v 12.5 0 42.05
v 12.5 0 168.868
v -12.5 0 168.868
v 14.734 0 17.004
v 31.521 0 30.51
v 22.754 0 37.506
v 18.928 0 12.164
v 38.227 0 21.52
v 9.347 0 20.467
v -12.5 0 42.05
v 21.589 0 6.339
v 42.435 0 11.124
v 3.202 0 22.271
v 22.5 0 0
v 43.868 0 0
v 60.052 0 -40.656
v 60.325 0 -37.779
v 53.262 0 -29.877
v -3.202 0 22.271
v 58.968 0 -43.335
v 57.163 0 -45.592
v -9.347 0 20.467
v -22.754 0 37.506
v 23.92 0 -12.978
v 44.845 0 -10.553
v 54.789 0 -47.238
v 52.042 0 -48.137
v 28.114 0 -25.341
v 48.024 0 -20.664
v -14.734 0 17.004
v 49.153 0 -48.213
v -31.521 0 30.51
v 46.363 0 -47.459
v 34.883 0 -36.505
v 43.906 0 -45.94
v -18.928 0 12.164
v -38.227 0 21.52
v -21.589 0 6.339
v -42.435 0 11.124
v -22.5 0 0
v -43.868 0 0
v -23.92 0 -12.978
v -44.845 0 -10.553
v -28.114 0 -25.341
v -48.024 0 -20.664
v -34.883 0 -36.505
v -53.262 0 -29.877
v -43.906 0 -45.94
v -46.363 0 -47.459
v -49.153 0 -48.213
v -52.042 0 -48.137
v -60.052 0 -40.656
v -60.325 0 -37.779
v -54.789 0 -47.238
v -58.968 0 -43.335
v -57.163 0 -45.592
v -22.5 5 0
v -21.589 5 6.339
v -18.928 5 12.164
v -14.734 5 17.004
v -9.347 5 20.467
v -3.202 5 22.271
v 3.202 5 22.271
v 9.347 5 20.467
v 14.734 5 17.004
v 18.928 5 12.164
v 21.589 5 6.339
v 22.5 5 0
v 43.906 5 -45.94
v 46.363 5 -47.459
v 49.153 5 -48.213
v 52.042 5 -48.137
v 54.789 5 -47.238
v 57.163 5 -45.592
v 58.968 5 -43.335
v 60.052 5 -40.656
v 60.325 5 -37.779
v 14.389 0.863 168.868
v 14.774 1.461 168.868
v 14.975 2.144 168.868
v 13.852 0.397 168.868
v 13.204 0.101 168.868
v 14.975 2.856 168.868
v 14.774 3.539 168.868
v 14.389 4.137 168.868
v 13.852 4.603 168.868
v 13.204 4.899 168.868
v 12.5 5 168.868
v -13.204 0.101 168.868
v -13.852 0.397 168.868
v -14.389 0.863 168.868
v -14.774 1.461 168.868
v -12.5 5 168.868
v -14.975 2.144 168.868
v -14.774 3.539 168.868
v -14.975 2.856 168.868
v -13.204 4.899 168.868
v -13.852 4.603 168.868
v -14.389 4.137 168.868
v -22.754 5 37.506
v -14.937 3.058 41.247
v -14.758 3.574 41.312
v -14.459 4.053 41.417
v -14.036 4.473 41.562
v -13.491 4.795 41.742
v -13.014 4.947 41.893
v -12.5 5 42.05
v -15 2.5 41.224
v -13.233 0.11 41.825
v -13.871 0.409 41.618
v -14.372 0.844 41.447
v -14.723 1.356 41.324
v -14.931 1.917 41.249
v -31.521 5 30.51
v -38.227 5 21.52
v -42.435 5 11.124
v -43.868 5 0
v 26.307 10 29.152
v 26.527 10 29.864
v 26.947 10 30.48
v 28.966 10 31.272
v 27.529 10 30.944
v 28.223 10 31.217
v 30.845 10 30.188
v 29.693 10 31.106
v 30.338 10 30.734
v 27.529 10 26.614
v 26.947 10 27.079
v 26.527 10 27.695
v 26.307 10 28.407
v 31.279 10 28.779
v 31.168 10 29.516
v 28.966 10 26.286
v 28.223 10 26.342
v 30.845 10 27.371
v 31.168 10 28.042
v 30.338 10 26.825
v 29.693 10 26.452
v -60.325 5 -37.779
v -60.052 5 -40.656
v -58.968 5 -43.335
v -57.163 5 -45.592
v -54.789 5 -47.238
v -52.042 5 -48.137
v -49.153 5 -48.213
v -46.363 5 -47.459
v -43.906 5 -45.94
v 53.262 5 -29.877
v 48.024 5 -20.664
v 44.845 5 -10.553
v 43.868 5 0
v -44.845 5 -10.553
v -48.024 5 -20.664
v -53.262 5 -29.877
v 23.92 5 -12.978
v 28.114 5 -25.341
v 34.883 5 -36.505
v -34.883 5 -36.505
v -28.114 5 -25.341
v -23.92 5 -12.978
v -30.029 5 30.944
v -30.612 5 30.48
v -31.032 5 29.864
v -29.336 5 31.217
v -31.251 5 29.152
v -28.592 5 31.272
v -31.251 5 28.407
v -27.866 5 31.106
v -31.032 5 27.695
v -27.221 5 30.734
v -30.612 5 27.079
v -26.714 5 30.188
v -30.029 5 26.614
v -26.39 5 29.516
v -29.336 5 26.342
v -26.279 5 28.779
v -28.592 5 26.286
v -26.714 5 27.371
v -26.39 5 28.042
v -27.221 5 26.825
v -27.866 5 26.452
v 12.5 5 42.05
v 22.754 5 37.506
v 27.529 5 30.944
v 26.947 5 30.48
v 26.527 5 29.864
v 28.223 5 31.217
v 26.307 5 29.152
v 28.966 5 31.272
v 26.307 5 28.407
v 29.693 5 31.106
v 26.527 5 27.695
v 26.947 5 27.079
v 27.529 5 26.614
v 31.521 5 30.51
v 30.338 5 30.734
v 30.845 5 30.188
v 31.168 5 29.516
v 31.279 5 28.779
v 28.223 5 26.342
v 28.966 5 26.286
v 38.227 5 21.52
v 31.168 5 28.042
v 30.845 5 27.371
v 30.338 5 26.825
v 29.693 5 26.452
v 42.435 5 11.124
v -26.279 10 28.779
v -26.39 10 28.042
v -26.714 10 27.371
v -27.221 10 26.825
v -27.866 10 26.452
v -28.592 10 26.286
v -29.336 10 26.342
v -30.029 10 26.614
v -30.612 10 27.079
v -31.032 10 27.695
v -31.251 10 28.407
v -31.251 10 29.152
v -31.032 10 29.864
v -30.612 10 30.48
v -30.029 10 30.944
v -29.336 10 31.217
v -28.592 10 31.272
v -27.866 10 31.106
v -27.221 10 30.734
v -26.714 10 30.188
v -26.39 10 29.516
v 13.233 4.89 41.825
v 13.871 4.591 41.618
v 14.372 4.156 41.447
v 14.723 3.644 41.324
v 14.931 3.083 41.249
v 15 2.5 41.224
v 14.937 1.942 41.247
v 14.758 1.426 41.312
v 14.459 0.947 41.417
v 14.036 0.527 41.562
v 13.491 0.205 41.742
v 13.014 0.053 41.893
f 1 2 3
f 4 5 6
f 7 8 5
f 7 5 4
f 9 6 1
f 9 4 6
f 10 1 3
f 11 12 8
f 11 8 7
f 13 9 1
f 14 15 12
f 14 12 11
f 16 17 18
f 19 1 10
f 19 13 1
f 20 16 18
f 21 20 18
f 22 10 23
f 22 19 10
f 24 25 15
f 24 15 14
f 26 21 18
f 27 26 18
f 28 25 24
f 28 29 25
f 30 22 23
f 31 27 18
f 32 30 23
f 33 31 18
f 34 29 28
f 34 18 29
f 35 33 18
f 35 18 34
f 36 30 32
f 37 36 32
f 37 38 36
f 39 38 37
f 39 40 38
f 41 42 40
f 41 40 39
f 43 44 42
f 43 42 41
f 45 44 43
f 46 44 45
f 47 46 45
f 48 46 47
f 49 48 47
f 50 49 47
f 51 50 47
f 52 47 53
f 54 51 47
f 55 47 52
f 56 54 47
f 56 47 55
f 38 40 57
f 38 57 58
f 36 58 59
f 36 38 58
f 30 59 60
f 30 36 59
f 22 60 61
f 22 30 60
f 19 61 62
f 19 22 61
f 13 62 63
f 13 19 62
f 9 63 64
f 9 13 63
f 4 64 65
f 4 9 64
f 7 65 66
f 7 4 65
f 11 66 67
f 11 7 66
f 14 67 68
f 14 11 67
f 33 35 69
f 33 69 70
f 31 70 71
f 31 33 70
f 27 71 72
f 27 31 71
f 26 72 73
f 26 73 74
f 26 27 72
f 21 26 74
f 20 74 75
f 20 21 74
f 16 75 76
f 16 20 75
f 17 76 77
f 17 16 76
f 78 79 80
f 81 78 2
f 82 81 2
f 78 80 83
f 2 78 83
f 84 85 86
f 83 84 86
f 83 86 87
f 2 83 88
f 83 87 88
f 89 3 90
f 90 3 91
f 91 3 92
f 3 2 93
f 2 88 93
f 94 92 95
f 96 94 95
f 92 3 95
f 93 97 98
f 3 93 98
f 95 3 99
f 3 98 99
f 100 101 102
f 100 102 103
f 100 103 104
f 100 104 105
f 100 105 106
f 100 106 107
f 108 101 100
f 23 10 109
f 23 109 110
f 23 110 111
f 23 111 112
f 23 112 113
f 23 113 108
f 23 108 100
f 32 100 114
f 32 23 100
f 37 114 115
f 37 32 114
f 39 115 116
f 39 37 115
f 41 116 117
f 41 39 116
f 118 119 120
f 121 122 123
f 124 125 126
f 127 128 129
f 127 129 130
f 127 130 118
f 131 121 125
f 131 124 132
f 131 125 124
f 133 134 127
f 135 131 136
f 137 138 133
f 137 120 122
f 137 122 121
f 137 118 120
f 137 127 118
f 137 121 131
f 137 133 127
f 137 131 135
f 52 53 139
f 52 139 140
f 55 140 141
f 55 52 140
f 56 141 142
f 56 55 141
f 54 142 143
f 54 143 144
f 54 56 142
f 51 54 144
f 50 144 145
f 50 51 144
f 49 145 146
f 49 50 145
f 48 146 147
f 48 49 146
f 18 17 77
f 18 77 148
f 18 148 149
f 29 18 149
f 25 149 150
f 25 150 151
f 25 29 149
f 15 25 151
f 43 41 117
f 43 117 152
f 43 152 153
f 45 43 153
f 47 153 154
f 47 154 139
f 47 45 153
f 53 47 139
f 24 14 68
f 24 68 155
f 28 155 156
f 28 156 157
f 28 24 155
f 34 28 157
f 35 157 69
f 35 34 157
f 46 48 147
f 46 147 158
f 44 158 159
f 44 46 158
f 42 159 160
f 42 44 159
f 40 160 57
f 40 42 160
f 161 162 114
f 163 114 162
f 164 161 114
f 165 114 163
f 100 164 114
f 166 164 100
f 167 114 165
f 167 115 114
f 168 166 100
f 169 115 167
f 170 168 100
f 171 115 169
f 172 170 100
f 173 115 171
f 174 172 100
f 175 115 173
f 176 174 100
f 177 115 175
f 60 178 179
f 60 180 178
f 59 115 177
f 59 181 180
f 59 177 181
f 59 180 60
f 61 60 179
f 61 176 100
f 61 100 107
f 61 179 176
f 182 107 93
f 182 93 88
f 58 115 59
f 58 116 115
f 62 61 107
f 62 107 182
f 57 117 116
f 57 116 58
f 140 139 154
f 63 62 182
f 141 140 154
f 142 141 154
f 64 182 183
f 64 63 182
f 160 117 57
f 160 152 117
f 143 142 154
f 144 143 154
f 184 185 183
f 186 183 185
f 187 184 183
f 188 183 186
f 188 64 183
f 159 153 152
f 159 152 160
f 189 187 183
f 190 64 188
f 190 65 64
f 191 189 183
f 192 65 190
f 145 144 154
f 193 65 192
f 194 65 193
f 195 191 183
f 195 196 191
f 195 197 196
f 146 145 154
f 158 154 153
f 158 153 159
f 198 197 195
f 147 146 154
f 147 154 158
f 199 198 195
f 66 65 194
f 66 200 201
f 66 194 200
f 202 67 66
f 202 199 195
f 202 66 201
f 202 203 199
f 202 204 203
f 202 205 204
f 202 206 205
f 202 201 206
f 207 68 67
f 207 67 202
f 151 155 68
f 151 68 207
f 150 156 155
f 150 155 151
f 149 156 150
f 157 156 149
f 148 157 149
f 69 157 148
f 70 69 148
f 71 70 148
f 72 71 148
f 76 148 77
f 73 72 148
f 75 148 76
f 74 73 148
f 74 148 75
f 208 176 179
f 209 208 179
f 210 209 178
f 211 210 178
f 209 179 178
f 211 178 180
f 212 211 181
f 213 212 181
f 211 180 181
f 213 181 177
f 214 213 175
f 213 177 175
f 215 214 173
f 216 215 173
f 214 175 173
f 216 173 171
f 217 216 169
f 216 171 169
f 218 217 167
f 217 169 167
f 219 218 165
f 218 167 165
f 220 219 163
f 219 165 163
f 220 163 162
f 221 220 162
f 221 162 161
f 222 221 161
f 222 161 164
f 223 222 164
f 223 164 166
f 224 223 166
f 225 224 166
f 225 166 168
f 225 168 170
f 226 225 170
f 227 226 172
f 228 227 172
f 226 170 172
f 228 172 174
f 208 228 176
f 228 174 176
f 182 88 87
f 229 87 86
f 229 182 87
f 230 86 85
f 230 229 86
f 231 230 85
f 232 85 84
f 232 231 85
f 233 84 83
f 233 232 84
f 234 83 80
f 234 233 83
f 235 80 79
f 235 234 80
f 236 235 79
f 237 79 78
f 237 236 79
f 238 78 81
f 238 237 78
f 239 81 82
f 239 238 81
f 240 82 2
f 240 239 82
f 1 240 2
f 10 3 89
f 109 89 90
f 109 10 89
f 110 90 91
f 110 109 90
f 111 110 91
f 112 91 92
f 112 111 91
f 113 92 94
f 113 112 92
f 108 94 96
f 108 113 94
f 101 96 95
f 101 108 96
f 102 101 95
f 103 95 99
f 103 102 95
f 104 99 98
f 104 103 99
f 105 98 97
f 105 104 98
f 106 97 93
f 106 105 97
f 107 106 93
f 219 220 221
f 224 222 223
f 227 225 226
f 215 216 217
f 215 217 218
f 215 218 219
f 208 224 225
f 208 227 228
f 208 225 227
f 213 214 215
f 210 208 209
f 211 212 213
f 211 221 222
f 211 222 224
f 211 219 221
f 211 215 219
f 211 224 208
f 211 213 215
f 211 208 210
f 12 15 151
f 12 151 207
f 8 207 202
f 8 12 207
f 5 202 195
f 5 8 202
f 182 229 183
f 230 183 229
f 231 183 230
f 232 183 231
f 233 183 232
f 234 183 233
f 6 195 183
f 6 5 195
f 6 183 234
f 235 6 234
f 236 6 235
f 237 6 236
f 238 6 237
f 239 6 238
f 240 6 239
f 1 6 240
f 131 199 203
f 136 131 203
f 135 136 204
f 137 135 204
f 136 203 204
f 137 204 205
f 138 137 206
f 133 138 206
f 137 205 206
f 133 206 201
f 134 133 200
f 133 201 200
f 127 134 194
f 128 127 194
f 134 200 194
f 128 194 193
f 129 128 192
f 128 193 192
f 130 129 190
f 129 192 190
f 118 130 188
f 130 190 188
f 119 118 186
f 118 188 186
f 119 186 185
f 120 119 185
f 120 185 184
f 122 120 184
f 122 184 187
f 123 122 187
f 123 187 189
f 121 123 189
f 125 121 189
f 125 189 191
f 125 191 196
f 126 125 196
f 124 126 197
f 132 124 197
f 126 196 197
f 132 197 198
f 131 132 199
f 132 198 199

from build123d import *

# Parameters (mm, degrees)
BOSS_EXTRUDE1_DEPTH = 5
SKETCH2_R           = 2.5
BOSS_EXTRUDE2_DEPTH = 5
BOSS_EXTRUDE3_START = -2.644184
BOSS_EXTRUDE3_DEPTH = 127.644184


with BuildPart() as part:
    # Sketch1 → Boss-Extrude1 (new body)
    with BuildSketch(Plane(origin=(0, 0, 0), x_dir=(1, 0, 0), z_dir=(0, 1, 0))):
        with BuildLine():
            ThreePointArc((-22.5, 0), (0, -22.5), (22.5, 0))
            ThreePointArc((22.5, 0), (28.11402228, 25.340983158), (43.905514247, 45.939804848))
            ThreePointArc((43.905514247, 45.939804848), (54.788632448, 47.238126581), (60.325213459, 37.779047778))
            ThreePointArc((60.325213459, 37.779047778), (48.023832429, 20.66372887), (43.868302884, 0))
            ThreePointArc((43.868302884, 0), (0, -43.868302884), (-43.868302884, 0))
            ThreePointArc((-43.868302884, 0), (-48.023832429, 20.66372887), (-60.325213459, 37.779047778))
            ThreePointArc((-60.325213459, 37.779047778), (-54.788632448, 47.238126581), (-43.905514247, 45.939804848))
            ThreePointArc((-43.905514247, 45.939804848), (-28.11402228, 25.340983158), (-22.5, 0))
        make_face()
    extrude(amount=BOSS_EXTRUDE1_DEPTH)

    # Sketch2 → Boss-Extrude2 (add)
    with BuildSketch(Plane(origin=(0, 5, 0), x_dir=(1, 0, 0), z_dir=(0, 1, 0))):
        with Locations((28.779245994, -28.779245994)):
            Circle(SKETCH2_R)
        with Locations((-28.779245994, -28.779245994)):
            Circle(SKETCH2_R)
    extrude(amount=BOSS_EXTRUDE2_DEPTH)

    # Sketch4 → Boss-Extrude3 (add)
    with BuildSketch(Plane(origin=(0, 5, 43.868302884), x_dir=(1, 0, 0), z_dir=(0, 0, 1)).offset(BOSS_EXTRUDE3_START)):
        with BuildLine():
            Line((12.5, -5), (-12.5, -5))
            ThreePointArc((-12.5, -5), (-15, -2.5), (-12.5, 0))
            Line((-12.5, 0), (12.5, 0))
            ThreePointArc((12.5, 0), (15, -2.5), (12.5, -5))
        make_face()
    extrude(amount=BOSS_EXTRUDE3_DEPTH)


solid = part.part
